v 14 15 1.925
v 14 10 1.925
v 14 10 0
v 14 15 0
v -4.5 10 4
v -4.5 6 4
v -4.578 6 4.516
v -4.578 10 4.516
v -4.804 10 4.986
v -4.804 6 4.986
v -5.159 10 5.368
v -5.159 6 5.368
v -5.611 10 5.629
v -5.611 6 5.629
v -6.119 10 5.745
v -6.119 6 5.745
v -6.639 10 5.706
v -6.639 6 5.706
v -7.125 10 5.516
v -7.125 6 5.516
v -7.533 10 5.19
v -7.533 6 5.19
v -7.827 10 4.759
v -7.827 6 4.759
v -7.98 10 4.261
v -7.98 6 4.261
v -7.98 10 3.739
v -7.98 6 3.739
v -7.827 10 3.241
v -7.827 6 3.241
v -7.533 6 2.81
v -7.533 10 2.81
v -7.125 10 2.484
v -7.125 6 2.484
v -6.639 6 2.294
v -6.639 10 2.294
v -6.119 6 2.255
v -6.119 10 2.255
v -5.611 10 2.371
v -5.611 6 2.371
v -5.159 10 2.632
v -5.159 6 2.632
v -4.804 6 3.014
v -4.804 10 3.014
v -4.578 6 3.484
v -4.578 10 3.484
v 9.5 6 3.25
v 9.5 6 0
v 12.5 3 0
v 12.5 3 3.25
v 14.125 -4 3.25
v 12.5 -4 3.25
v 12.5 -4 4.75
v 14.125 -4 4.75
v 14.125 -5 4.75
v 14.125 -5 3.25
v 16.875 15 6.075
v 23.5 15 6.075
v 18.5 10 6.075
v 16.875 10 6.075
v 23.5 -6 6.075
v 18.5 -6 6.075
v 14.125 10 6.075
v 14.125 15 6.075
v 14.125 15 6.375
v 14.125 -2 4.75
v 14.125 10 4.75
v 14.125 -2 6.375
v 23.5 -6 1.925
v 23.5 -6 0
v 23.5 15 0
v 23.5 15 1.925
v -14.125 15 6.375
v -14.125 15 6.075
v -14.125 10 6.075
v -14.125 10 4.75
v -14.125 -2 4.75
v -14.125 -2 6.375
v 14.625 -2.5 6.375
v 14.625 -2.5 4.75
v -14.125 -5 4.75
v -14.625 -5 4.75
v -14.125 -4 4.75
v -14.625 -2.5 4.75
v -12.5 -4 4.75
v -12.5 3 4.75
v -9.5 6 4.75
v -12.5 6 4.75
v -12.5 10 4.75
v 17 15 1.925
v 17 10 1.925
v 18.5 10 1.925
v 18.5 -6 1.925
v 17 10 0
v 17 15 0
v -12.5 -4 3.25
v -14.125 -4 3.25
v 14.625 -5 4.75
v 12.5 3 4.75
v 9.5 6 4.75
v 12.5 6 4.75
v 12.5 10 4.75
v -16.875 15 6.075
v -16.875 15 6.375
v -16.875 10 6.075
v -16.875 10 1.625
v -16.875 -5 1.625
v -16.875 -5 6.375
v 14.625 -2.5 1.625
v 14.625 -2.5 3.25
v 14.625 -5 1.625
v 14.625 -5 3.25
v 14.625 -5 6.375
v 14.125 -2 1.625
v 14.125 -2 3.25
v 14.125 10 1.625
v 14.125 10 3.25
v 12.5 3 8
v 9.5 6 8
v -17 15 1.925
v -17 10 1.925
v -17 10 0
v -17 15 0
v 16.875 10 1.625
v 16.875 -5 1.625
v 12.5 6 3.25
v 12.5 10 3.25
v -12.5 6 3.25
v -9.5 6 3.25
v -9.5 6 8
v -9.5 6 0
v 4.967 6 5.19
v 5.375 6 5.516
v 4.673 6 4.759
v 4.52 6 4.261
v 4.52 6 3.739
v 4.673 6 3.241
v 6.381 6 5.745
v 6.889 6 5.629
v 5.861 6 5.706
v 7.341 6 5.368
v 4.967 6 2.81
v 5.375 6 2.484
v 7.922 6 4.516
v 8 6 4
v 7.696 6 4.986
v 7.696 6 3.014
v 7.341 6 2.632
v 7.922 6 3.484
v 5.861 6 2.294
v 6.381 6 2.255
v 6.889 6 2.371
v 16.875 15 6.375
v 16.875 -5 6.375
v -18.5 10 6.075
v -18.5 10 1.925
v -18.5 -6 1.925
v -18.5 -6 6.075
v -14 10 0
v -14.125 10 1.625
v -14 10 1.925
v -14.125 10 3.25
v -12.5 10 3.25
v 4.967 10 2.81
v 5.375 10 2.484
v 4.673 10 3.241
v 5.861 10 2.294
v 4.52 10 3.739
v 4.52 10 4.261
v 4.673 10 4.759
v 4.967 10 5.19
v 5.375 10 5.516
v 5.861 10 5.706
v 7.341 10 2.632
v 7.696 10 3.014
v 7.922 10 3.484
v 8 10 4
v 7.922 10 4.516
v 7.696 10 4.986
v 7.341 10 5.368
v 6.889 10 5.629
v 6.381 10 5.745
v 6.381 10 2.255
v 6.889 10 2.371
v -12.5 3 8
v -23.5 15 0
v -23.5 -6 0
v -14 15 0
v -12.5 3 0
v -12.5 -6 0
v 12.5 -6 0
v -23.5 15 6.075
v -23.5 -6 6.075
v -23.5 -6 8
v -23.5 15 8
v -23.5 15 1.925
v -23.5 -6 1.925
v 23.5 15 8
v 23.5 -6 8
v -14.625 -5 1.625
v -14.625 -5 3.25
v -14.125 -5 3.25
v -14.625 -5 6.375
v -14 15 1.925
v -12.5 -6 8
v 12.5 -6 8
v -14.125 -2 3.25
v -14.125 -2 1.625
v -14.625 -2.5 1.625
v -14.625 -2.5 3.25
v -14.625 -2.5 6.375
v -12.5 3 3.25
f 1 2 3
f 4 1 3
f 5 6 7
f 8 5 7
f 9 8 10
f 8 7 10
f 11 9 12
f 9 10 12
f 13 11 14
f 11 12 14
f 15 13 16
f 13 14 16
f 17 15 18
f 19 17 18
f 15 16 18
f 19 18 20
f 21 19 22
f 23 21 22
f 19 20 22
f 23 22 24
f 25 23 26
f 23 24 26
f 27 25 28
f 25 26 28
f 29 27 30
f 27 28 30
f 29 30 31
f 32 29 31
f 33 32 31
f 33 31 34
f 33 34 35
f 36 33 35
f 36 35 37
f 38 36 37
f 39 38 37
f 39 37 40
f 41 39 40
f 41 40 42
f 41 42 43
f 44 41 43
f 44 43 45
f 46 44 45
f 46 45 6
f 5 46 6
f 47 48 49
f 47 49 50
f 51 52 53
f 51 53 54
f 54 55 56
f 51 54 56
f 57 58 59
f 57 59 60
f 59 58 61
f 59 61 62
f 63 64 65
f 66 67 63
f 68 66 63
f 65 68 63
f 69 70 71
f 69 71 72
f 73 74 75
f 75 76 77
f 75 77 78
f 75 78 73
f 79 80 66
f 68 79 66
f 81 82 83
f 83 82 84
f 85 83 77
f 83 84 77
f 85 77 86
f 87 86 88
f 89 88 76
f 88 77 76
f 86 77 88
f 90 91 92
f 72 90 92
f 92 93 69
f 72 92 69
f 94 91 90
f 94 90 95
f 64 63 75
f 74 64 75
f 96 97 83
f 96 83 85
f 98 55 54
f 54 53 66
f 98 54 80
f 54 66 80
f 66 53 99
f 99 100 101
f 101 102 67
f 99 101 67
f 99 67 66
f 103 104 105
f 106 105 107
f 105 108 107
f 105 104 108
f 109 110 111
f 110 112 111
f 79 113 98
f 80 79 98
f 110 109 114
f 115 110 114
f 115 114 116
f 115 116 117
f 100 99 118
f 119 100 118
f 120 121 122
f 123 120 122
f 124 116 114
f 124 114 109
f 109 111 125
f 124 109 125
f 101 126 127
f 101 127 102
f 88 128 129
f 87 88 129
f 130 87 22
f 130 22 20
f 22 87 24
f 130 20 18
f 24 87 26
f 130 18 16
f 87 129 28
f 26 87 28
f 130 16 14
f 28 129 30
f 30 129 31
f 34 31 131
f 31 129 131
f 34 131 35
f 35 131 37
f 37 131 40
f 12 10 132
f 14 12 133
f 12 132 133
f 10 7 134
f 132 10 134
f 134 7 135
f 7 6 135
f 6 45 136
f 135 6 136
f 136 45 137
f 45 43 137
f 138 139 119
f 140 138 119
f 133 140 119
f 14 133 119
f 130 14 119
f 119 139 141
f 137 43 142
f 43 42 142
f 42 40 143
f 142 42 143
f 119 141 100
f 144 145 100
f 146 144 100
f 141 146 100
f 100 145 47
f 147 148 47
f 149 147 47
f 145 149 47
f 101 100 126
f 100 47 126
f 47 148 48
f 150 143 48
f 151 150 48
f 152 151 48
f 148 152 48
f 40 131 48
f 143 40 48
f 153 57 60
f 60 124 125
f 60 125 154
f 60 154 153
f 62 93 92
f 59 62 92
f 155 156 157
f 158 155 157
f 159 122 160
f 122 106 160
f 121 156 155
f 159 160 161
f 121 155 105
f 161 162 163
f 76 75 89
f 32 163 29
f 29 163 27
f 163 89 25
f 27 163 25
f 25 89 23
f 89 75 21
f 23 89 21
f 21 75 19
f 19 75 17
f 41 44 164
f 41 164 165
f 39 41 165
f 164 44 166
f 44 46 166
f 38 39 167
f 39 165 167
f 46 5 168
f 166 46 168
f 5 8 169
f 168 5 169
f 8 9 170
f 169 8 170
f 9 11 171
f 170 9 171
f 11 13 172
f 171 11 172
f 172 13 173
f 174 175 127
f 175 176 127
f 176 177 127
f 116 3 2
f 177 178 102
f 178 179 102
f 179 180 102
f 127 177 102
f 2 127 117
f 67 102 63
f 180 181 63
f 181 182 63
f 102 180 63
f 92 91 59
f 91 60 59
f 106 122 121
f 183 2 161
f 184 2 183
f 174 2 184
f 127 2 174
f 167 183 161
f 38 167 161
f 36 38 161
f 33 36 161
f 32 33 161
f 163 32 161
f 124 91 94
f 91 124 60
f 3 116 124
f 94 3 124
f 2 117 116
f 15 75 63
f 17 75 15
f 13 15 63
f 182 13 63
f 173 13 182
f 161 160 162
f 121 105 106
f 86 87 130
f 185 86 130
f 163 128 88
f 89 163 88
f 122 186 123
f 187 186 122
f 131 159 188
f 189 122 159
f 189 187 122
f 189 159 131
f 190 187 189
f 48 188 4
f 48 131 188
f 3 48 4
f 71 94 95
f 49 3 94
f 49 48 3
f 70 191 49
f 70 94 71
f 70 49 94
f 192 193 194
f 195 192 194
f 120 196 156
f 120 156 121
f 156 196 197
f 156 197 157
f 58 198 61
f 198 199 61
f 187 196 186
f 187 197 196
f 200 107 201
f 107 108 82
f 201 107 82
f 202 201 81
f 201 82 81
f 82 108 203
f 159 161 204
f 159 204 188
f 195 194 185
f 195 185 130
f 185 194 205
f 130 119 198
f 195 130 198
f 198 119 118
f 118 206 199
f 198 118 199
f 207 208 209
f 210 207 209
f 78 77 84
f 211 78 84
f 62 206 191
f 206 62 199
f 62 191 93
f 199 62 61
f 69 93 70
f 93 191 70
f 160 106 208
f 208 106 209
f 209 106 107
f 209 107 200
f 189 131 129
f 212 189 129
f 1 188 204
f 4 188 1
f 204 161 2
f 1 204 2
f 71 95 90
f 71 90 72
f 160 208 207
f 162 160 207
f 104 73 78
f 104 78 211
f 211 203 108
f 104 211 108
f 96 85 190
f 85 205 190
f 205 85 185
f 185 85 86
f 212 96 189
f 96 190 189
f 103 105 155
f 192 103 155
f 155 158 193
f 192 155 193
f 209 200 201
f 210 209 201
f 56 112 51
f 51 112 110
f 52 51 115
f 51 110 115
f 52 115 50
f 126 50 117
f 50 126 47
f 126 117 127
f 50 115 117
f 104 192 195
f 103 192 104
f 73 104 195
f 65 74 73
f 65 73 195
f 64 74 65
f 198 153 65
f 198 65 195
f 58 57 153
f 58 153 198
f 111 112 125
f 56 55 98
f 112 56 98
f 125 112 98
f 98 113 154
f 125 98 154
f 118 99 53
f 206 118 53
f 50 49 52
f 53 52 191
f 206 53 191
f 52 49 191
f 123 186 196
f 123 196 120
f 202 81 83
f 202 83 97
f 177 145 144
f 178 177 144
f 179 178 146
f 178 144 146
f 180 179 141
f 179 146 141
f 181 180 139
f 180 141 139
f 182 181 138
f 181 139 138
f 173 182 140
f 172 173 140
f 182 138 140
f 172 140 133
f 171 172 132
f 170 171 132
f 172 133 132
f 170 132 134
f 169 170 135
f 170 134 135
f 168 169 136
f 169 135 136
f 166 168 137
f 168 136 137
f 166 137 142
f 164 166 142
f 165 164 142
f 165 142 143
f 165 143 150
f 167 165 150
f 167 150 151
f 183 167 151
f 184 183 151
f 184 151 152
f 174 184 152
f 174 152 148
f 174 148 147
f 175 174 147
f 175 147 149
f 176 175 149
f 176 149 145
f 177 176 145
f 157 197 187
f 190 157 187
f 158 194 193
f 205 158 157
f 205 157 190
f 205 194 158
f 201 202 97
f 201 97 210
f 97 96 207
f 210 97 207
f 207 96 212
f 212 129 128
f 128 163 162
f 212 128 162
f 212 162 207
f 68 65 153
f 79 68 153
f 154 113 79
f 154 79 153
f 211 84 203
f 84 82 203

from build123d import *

# Parameters (mm, degrees)
EXTRUDE_1_DEPTH     = 8
CUT_EXTRUDE_START   = -1
SKETCH_2_W          = 2.75
SKETCH_2_H          = 4.75
SKETCH_2_W_2        = 1.625
SKETCH_2_H_2        = 1.5
CUT_EXTRUDE_1_DEPTH = 25.734218465
SKETCH_3_W          = 0.5
SKETCH_3_H          = 1.625
EXTRUDE_2_DEPTH     = 2
CHAMFER_1_SIZE      = 1
SKETCH_4_W          = 1.625
SKETCH_4_H          = 1.5
EXTRUDE_3_DEPTH     = 1
CHAMFER_2_SIZE      = 3
SKETCH_5_W          = 5
SKETCH_5_H          = 1.925
EXTRUDE_4_DEPTH     = 16
SKETCH_6_W          = 6.5
SKETCH_6_H          = 1.925
SKETCH_6_W_2        = 28
EXTRUDE_5_DEPTH     = 5
SKETCH_7_R          = 1.75
CUT_EXTRUDE_2_DEPTH = 28.572631358


with BuildPart() as part:
    # Эскиз1 → Бобышка-Вытянуть1 (new body)
    with BuildSketch(Plane.XY):
        Polygon((-18.5, -6), (-12.5, -6), (-12.5, 6), (12.5, 6), (12.5, -6), (18.5, -6), (18.5, 10), (-18.5, 10), align=None)
    extrude(amount=EXTRUDE_1_DEPTH)

    # Эскиз2 → Вырез-Вытянуть1 (cut, through all)
    with BuildSketch(Plane.XZ.offset(6).offset(CUT_EXTRUDE_START)):
        with Locations((15.5, 4)):
            Rectangle(SKETCH_2_W, SKETCH_2_H)
        with Locations((13.3125, 4)):
            Rectangle(SKETCH_2_W_2, SKETCH_2_H_2)
        with Locations((-13.3125, 4)):
            Rectangle(SKETCH_2_W_2, SKETCH_2_H_2)
        Polygon((-14.125, 1.625), (-14.125, 3.25), (-14.125, 4.75), (-14.125, 6.375), (-16.875, 6.375), (-16.875, 1.625), align=None)
    extrude(amount=-CUT_EXTRUDE_1_DEPTH, mode=Mode.SUBTRACT)

    # Эскиз3 → Бобышка-Вытянуть2 (add)
    with BuildSketch(Plane(origin=(0, -5, 0), x_dir=(1, 0, 0), z_dir=(0, 1, 0))):
        with Locations((-14.375, -2.4375)):
            Rectangle(SKETCH_3_W, SKETCH_3_H)
        with Locations((-14.375, -5.5625)):
            Rectangle(SKETCH_3_W, SKETCH_3_H)
        with Locations((14.375, -5.5625)):
            Rectangle(SKETCH_3_W, SKETCH_3_H)
        with Locations((14.375, -2.4375)):
            Rectangle(SKETCH_3_W, SKETCH_3_H)
    extrude(amount=EXTRUDE_2_DEPTH)

    # Фаска1
    # the kernel refuses this chamfer: 1 mm, written as the material it adds along each edge
    with BuildSketch(Plane(origin=(-14.125, -3, 2.178317012), x_dir=(0.02749587661058563, 0.9996219169112968, 0), z_dir=(0, 0, 1))) as chamfer_1_piece_1_section:
        Polygon((CHAMFER_1_SIZE * 0.999621916911, CHAMFER_1_SIZE * 0.0274958766106), (-CHAMFER_1_SIZE * 0.0274958766106, CHAMFER_1_SIZE * 0.999621916911), (0, 0), align=None)
    chamfer_1_piece_1 = extrude(amount=6.768365976, mode=Mode.PRIVATE)
    chamfer_1_piece_1 = split(chamfer_1_piece_1, bisect_by=Plane(origin=(-14.625, -2.611111111, 2.714158506), z_dir=(1, 0, 0)), keep=Keep.TOP, mode=Mode.PRIVATE)
    chamfer_1_piece_1 = split(chamfer_1_piece_1, bisect_by=Plane(origin=(-14.347222222, -2.611111111, 3.25), z_dir=(0, 0, -1)), keep=Keep.TOP, mode=Mode.PRIVATE)
    add(chamfer_1_piece_1)
    with BuildSketch(Plane(origin=(-14.125, -3, 4.75), x_dir=(0.027495876610583895, 0.9996219169112968, 0), z_dir=(0, 0, 1))) as chamfer_1_piece_2_section:
        Polygon((CHAMFER_1_SIZE * 0.999621916911, CHAMFER_1_SIZE * 0.0274958766106), (-CHAMFER_1_SIZE * 0.0274958766106, CHAMFER_1_SIZE * 0.999621916911), (0, 0), align=None)
    chamfer_1_piece_2 = extrude(amount=1.625, mode=Mode.PRIVATE)
    chamfer_1_piece_2 = split(chamfer_1_piece_2, bisect_by=Plane(origin=(-14.625, -2.611111111, 5.5625), z_dir=(1, 0, 0)), keep=Keep.TOP, mode=Mode.PRIVATE)
    add(chamfer_1_piece_2)
    with BuildSketch(Plane(origin=(14.125, -3, 2.178317012), x_dir=(0.9996219169112968, -0.02749587661058651, -1.092729371642936e-15), z_dir=(0, 0, 1))) as chamfer_1_piece_3_section:
        Polygon((CHAMFER_1_SIZE * 0.999621916911, CHAMFER_1_SIZE * 0.0274958766106), (-CHAMFER_1_SIZE * 0.0274958766106, CHAMFER_1_SIZE * 0.999621916911), (0, 0), align=None)
    chamfer_1_piece_3 = extrude(amount=6.768365976, mode=Mode.PRIVATE)
    chamfer_1_piece_3 = split(chamfer_1_piece_3, bisect_by=Plane(origin=(14.347222222, -2.611111111, 3.25), z_dir=(0, 0, -1)), keep=Keep.TOP, mode=Mode.PRIVATE)
    chamfer_1_piece_3 = split(chamfer_1_piece_3, bisect_by=Plane(origin=(14.625, -2.611111111, 2.714158506), z_dir=(-1, 0, 0)), keep=Keep.TOP, mode=Mode.PRIVATE)
    add(chamfer_1_piece_3)
    with BuildSketch(Plane(origin=(14.125, -3, 4.75), x_dir=(0.9996219169112968, -0.02749587661058651, -1.092729371642936e-15), z_dir=(0, 0, 1))) as chamfer_1_piece_4_section:
        Polygon((CHAMFER_1_SIZE * 0.999621916911, CHAMFER_1_SIZE * 0.0274958766106), (-CHAMFER_1_SIZE * 0.0274958766106, CHAMFER_1_SIZE * 0.999621916911), (0, 0), align=None)
    chamfer_1_piece_4 = extrude(amount=1.625, mode=Mode.PRIVATE)
    chamfer_1_piece_4 = split(chamfer_1_piece_4, bisect_by=Plane(origin=(14.625, -2.611111111, 5.5625), z_dir=(-1, 0, 0)), keep=Keep.TOP, mode=Mode.PRIVATE)
    add(chamfer_1_piece_4)
    with BuildSketch(Plane(origin=(14.125, -3, 5.821682988), x_dir=(0.9996219169112968, -0.02749587661058651, 0), z_dir=(0, 0, -1))) as chamfer_1_piece_5_section:
        Polygon((CHAMFER_1_SIZE * 0.999621916911, -CHAMFER_1_SIZE * 0.0274958766106), (-CHAMFER_1_SIZE * 0.0274958766106, -CHAMFER_1_SIZE * 0.999621916911), (0, 0), align=None)
    chamfer_1_piece_5 = extrude(amount=6.768365976, mode=Mode.PRIVATE)
    chamfer_1_piece_5 = split(chamfer_1_piece_5, bisect_by=Plane(origin=(14.625, -2.611111111, 5.285841494), z_dir=(-1, 0, 0)), keep=Keep.TOP, mode=Mode.PRIVATE)
    chamfer_1_piece_5 = split(chamfer_1_piece_5, bisect_by=Plane(origin=(14.347222222, -2.611111111, 4.75), z_dir=(0, 0, 1)), keep=Keep.TOP, mode=Mode.PRIVATE)
    add(chamfer_1_piece_5)
    with BuildSketch(Plane(origin=(14.125, -3, 3.25), x_dir=(0.9996219169112968, -0.02749587661058651, 0), z_dir=(0, 0, -1))) as chamfer_1_piece_6_section:
        Polygon((CHAMFER_1_SIZE * 0.999621916911, -CHAMFER_1_SIZE * 0.0274958766106), (-CHAMFER_1_SIZE * 0.0274958766106, -CHAMFER_1_SIZE * 0.999621916911), (0, 0), align=None)
    chamfer_1_piece_6 = extrude(amount=4.196682988, mode=Mode.PRIVATE)
    chamfer_1_piece_6 = split(chamfer_1_piece_6, bisect_by=Plane(origin=(14.625, -2.611111111, 2.4375), z_dir=(-1, 0, 0)), keep=Keep.TOP, mode=Mode.PRIVATE)
    chamfer_1_piece_6 = split(chamfer_1_piece_6, bisect_by=Plane(origin=(14.347222222, -2.611111111, 0), z_dir=(0, 0, 1)), keep=Keep.TOP, mode=Mode.PRIVATE)
    add(chamfer_1_piece_6)
    with BuildSketch(Plane(origin=(-14.125, -3, 5.821682988), x_dir=(0.02749587661058563, 0.9996219169112968, 0), z_dir=(0, 0, -1))) as chamfer_1_piece_7_section:
        Polygon((CHAMFER_1_SIZE * 0.999621916911, -CHAMFER_1_SIZE * 0.0274958766106), (-CHAMFER_1_SIZE * 0.0274958766106, -CHAMFER_1_SIZE * 0.999621916911), (0, 0), align=None)
    chamfer_1_piece_7 = extrude(amount=6.768365976, mode=Mode.PRIVATE)
    chamfer_1_piece_7 = split(chamfer_1_piece_7, bisect_by=Plane(origin=(-14.347222222, -2.611111111, 4.75), z_dir=(0, 0, 1)), keep=Keep.TOP, mode=Mode.PRIVATE)
    chamfer_1_piece_7 = split(chamfer_1_piece_7, bisect_by=Plane(origin=(-14.625, -2.611111111, 5.285841494), z_dir=(1, 0, 0)), keep=Keep.TOP, mode=Mode.PRIVATE)
    add(chamfer_1_piece_7)
    with BuildSketch(Plane(origin=(-14.125, -3, 3.25), x_dir=(0.02749587661058563, 0.9996219169112968, 0), z_dir=(0, 0, -1))) as chamfer_1_piece_8_section:
        Polygon((CHAMFER_1_SIZE * 0.999621916911, -CHAMFER_1_SIZE * 0.0274958766106), (-CHAMFER_1_SIZE * 0.0274958766106, -CHAMFER_1_SIZE * 0.999621916911), (0, 0), align=None)
    chamfer_1_piece_8 = extrude(amount=4.196682988, mode=Mode.PRIVATE)
    chamfer_1_piece_8 = split(chamfer_1_piece_8, bisect_by=Plane(origin=(-14.625, -2.611111111, 2.4375), z_dir=(1, 0, 0)), keep=Keep.TOP, mode=Mode.PRIVATE)
    chamfer_1_piece_8 = split(chamfer_1_piece_8, bisect_by=Plane(origin=(-14.347222222, -2.611111111, 0), z_dir=(0, 0, 1)), keep=Keep.TOP, mode=Mode.PRIVATE)
    add(chamfer_1_piece_8)

    # Эскиз4 → Бобышка-Вытянуть3 (add)
    with BuildSketch(Plane(origin=(0, -5, 0), x_dir=(1, 0, 0), z_dir=(0, 1, 0))):
        with Locations((-13.3125, -4)):
            Rectangle(SKETCH_4_W, SKETCH_4_H)
        with Locations((13.3125, -4)):
            Rectangle(SKETCH_4_W, SKETCH_4_H)
    extrude(amount=EXTRUDE_3_DEPTH)

    # Фаска2
    chamfer_2_edges = [part.edges().sort_by_distance(p)[0] for p in [
        (12.5, 6, 6.375),
        (-12.5, 6, 6.375),
        (12.5, 6, 1.625),
        (-12.5, 6, 1.625),
    ]]
    chamfer(chamfer_2_edges, length=CHAMFER_2_SIZE)

    # Эскиз5 → Бобышка-Вытянуть4 (add, through all)
    with BuildSketch(Plane.XZ.offset(6)):
        with Locations((-21, 7.0375)):
            Rectangle(SKETCH_5_W, SKETCH_5_H)
        with Locations((-21, 0.9625)):
            Rectangle(SKETCH_5_W, SKETCH_5_H)
        with Locations((21, 7.0375)):
            Rectangle(SKETCH_5_W, SKETCH_5_H)
        with Locations((21, 0.9625)):
            Rectangle(SKETCH_5_W, SKETCH_5_H)
    extrude(amount=-EXTRUDE_4_DEPTH)

    # Эскиз6 → Бобышка-Вытянуть5 (add)
    with BuildSketch(Plane(origin=(0, 10, 0), x_dir=(1, 0, 0), z_dir=(0, 1, 0))):
        with Locations((-20.25, -0.9625)):
            Rectangle(SKETCH_6_W, SKETCH_6_H)
        with Locations((0, -0.9625)):
            Rectangle(SKETCH_6_W_2, SKETCH_6_H)
        with Locations((20.25, -0.9625)):
            Rectangle(SKETCH_6_W, SKETCH_6_H)
        Polygon((-16.875, -6.375), (-16.875, -6.075), (-23.5, -6.075), (-23.5, -8), (23.5, -8), (23.5, -6.075), (16.875, -6.075), (16.875, -6.375), (14.125, -6.375), (14.125, -6.075), (-14.125, -6.075), (-14.125, -6.375), align=None)
    extrude(amount=EXTRUDE_5_DEPTH)

    # Эскиз7 → Вырез-Вытянуть2 (cut, through all)
    with BuildSketch(Plane.XZ.offset(-6)):
        with Locations((-6.25, 4)):
            Circle(SKETCH_7_R)
        with Locations((6.25, 4)):
            Circle(SKETCH_7_R)
    extrude(amount=-CUT_EXTRUDE_2_DEPTH, mode=Mode.SUBTRACT)


solid = part.part
